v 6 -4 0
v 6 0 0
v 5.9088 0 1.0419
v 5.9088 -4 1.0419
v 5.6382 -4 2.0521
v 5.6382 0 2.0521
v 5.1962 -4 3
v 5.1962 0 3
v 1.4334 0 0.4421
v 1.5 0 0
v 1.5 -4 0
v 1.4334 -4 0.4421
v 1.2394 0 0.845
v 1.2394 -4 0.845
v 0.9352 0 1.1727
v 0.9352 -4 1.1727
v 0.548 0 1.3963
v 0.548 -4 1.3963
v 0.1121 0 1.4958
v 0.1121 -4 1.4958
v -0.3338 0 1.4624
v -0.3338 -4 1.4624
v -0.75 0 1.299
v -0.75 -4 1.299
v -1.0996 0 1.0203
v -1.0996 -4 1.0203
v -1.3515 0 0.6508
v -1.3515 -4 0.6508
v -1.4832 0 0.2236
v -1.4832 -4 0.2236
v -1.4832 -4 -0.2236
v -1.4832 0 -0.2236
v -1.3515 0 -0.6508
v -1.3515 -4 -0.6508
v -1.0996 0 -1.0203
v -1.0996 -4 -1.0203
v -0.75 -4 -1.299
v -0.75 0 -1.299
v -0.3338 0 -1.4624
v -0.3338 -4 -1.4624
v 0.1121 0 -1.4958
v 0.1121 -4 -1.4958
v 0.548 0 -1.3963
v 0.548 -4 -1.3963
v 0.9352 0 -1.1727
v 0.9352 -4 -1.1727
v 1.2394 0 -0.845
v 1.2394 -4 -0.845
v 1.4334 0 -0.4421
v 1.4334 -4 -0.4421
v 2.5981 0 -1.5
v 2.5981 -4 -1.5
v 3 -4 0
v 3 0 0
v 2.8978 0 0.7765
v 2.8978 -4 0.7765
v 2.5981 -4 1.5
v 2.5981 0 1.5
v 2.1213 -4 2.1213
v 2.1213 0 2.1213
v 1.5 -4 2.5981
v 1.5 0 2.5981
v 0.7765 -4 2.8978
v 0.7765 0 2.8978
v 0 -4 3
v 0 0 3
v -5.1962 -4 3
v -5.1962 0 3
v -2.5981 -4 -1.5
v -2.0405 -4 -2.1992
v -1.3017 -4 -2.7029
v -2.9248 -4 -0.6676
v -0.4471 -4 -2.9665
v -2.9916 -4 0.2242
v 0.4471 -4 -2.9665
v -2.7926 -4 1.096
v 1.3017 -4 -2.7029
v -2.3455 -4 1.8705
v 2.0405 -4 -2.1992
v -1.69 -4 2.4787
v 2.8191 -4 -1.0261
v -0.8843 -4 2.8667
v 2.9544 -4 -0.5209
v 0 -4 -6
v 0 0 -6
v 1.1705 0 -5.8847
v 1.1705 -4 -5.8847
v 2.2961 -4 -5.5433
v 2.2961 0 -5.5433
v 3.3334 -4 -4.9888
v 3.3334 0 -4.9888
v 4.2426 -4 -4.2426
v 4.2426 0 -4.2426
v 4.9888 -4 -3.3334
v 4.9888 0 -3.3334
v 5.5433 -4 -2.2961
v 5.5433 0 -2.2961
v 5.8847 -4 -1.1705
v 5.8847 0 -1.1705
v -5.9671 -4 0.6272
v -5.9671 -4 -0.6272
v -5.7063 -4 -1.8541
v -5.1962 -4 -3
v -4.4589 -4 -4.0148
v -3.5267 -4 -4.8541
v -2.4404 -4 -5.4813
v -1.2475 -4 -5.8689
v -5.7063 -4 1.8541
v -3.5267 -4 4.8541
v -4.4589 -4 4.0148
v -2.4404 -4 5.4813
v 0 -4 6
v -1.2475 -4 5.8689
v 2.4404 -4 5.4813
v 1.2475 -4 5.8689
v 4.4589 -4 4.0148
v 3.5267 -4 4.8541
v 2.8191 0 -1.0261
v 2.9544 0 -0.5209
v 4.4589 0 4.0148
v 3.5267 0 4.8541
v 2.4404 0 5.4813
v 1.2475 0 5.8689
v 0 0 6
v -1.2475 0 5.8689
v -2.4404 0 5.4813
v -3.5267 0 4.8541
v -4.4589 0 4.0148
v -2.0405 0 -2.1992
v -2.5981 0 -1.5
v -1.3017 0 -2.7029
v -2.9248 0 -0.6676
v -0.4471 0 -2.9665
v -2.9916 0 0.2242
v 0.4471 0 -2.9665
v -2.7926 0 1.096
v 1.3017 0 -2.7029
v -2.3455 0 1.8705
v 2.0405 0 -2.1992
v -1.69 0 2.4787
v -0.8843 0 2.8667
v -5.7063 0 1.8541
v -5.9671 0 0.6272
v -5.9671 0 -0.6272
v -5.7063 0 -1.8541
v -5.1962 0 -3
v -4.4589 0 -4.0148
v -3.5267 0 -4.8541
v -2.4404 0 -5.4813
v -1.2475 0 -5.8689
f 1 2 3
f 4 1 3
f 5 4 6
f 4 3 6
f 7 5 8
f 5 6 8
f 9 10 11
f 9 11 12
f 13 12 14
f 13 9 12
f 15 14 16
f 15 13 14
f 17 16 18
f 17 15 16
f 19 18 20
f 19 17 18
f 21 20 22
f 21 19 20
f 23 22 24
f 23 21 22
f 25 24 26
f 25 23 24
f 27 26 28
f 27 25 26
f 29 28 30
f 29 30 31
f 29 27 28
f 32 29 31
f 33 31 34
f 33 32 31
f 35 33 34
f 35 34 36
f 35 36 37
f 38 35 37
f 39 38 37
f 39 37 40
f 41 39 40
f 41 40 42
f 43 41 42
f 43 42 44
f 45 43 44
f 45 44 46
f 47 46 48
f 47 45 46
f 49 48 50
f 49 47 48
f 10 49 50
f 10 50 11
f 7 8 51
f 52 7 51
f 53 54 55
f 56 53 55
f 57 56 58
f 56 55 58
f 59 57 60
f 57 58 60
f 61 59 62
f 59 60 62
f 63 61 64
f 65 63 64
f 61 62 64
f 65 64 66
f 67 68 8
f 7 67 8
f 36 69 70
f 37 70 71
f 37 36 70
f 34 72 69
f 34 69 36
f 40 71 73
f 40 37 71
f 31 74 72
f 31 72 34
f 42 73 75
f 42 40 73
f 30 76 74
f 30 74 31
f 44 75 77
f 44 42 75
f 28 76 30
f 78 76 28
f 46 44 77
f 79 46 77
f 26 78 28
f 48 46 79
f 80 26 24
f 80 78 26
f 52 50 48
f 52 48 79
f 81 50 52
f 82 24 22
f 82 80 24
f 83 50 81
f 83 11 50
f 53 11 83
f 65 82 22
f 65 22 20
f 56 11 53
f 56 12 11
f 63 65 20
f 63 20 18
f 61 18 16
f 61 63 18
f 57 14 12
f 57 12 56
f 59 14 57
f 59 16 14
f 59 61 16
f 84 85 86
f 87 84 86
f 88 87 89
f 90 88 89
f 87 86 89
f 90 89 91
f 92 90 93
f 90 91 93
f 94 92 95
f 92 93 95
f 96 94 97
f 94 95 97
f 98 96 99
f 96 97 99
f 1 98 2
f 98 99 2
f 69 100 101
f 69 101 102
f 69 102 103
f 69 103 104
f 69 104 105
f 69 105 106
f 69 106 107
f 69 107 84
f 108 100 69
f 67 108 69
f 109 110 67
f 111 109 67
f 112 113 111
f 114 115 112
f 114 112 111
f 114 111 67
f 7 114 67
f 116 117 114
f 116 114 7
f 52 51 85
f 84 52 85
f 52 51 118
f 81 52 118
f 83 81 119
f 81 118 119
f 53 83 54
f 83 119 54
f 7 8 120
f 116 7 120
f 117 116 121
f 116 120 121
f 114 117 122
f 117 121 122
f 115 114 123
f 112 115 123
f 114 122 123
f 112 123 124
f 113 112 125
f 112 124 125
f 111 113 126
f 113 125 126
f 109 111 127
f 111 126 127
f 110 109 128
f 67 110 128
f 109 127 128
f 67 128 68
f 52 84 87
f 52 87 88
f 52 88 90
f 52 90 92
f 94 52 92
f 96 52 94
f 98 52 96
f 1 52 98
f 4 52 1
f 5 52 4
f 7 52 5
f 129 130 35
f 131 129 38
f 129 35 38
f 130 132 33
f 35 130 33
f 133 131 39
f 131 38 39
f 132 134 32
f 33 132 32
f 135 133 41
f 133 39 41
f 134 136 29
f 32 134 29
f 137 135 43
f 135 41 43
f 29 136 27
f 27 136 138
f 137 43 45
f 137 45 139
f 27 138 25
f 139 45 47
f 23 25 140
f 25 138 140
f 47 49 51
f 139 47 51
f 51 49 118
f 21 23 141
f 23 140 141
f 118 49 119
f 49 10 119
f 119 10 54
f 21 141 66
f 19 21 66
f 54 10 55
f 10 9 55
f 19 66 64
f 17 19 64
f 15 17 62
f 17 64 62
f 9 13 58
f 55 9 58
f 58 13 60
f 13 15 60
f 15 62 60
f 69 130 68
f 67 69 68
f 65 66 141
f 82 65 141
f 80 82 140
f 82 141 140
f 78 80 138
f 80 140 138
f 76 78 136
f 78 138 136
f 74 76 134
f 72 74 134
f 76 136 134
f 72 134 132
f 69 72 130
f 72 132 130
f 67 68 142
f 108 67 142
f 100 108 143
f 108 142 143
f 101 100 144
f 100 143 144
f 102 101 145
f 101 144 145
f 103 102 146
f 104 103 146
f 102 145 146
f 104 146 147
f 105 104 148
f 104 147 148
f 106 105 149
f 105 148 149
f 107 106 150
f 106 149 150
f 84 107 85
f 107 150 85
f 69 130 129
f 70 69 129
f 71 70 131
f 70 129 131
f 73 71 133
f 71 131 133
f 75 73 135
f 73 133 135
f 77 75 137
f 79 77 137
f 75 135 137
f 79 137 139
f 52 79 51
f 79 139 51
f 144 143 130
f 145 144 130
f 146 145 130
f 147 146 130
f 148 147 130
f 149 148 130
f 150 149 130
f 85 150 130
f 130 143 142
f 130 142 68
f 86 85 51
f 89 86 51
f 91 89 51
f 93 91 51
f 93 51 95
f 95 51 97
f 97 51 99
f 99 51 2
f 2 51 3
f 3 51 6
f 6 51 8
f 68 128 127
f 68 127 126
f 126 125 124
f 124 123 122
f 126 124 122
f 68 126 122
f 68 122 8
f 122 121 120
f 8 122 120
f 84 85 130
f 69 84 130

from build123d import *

# Parameters (mm, degrees)
F1_DEPTH = 4
F0_R     = 1.5


with BuildPart() as f1:
    # F0 (on Front) → F1 (new body)
    with BuildSketch(Plane.XZ):
        with BuildLine():
            Line((-5.1961524227, 3), (0, 3))
            Line((0, 3), (5.1961524227, 3))
            ThreePointArc((5.1961524227, 3), (0, 6), (-5.1961524227, 3))
        make_face()
    extrude(amount=F1_DEPTH)


with BuildPart() as f1b:
    # F0 (on Front) → F1, piece 2 (new body)
    with BuildSketch(Plane.XZ):
        with BuildLine():
            Line((5.1961524227, 3), (2.5980761941, -1.5000000299))
            Line((2.5980761941, -1.5000000299), (0, -6))
            ThreePointArc((0, -6), (4.2426406871, -4.2426406871), (6, 0))
            ThreePointArc((6, 0), (5.7955549577, 1.5529142706), (5.1961524227, 3))
        make_face()
    extrude(amount=F1_DEPTH)


with BuildPart() as f1c:
    # F0 (on Front) → F1, piece 3 (new body)
    with BuildSketch(Plane.XZ):
        with BuildLine():
            Line((0, -6), (-2.5980761936, -1.5000000308))
            Line((-2.5980761936, -1.5000000308), (-5.1961524227, 3))
            ThreePointArc((-5.1961524227, 3), (-5.1961524227, -3), (0, -6))
        make_face()
    extrude(amount=F1_DEPTH)


with BuildPart() as f1d:
    # F0 (on Front) → F1, piece 4 (new body)
    with BuildSketch(Plane.XZ):
        with BuildLine():
            ThreePointArc((2.5980761941, -1.5000000299), (2.8977774744, -0.776457152), (3, 0))
            ThreePointArc((3, 0), (2.1213203436, 2.1213203436), (0, 3))
            ThreePointArc((0, 3), (-2.5980762202, 1.4999999846), (-2.5980761936, -1.5000000308))
            ThreePointArc((-2.5980761936, -1.5000000308), (5e-10, -3), (2.5980761941, -1.5000000299))
        make_face()
        Circle(F0_R, mode=Mode.SUBTRACT)
    extrude(amount=F1_DEPTH)


solid = Compound([f1.part, f1b.part, f1c.part, f1d.part])
